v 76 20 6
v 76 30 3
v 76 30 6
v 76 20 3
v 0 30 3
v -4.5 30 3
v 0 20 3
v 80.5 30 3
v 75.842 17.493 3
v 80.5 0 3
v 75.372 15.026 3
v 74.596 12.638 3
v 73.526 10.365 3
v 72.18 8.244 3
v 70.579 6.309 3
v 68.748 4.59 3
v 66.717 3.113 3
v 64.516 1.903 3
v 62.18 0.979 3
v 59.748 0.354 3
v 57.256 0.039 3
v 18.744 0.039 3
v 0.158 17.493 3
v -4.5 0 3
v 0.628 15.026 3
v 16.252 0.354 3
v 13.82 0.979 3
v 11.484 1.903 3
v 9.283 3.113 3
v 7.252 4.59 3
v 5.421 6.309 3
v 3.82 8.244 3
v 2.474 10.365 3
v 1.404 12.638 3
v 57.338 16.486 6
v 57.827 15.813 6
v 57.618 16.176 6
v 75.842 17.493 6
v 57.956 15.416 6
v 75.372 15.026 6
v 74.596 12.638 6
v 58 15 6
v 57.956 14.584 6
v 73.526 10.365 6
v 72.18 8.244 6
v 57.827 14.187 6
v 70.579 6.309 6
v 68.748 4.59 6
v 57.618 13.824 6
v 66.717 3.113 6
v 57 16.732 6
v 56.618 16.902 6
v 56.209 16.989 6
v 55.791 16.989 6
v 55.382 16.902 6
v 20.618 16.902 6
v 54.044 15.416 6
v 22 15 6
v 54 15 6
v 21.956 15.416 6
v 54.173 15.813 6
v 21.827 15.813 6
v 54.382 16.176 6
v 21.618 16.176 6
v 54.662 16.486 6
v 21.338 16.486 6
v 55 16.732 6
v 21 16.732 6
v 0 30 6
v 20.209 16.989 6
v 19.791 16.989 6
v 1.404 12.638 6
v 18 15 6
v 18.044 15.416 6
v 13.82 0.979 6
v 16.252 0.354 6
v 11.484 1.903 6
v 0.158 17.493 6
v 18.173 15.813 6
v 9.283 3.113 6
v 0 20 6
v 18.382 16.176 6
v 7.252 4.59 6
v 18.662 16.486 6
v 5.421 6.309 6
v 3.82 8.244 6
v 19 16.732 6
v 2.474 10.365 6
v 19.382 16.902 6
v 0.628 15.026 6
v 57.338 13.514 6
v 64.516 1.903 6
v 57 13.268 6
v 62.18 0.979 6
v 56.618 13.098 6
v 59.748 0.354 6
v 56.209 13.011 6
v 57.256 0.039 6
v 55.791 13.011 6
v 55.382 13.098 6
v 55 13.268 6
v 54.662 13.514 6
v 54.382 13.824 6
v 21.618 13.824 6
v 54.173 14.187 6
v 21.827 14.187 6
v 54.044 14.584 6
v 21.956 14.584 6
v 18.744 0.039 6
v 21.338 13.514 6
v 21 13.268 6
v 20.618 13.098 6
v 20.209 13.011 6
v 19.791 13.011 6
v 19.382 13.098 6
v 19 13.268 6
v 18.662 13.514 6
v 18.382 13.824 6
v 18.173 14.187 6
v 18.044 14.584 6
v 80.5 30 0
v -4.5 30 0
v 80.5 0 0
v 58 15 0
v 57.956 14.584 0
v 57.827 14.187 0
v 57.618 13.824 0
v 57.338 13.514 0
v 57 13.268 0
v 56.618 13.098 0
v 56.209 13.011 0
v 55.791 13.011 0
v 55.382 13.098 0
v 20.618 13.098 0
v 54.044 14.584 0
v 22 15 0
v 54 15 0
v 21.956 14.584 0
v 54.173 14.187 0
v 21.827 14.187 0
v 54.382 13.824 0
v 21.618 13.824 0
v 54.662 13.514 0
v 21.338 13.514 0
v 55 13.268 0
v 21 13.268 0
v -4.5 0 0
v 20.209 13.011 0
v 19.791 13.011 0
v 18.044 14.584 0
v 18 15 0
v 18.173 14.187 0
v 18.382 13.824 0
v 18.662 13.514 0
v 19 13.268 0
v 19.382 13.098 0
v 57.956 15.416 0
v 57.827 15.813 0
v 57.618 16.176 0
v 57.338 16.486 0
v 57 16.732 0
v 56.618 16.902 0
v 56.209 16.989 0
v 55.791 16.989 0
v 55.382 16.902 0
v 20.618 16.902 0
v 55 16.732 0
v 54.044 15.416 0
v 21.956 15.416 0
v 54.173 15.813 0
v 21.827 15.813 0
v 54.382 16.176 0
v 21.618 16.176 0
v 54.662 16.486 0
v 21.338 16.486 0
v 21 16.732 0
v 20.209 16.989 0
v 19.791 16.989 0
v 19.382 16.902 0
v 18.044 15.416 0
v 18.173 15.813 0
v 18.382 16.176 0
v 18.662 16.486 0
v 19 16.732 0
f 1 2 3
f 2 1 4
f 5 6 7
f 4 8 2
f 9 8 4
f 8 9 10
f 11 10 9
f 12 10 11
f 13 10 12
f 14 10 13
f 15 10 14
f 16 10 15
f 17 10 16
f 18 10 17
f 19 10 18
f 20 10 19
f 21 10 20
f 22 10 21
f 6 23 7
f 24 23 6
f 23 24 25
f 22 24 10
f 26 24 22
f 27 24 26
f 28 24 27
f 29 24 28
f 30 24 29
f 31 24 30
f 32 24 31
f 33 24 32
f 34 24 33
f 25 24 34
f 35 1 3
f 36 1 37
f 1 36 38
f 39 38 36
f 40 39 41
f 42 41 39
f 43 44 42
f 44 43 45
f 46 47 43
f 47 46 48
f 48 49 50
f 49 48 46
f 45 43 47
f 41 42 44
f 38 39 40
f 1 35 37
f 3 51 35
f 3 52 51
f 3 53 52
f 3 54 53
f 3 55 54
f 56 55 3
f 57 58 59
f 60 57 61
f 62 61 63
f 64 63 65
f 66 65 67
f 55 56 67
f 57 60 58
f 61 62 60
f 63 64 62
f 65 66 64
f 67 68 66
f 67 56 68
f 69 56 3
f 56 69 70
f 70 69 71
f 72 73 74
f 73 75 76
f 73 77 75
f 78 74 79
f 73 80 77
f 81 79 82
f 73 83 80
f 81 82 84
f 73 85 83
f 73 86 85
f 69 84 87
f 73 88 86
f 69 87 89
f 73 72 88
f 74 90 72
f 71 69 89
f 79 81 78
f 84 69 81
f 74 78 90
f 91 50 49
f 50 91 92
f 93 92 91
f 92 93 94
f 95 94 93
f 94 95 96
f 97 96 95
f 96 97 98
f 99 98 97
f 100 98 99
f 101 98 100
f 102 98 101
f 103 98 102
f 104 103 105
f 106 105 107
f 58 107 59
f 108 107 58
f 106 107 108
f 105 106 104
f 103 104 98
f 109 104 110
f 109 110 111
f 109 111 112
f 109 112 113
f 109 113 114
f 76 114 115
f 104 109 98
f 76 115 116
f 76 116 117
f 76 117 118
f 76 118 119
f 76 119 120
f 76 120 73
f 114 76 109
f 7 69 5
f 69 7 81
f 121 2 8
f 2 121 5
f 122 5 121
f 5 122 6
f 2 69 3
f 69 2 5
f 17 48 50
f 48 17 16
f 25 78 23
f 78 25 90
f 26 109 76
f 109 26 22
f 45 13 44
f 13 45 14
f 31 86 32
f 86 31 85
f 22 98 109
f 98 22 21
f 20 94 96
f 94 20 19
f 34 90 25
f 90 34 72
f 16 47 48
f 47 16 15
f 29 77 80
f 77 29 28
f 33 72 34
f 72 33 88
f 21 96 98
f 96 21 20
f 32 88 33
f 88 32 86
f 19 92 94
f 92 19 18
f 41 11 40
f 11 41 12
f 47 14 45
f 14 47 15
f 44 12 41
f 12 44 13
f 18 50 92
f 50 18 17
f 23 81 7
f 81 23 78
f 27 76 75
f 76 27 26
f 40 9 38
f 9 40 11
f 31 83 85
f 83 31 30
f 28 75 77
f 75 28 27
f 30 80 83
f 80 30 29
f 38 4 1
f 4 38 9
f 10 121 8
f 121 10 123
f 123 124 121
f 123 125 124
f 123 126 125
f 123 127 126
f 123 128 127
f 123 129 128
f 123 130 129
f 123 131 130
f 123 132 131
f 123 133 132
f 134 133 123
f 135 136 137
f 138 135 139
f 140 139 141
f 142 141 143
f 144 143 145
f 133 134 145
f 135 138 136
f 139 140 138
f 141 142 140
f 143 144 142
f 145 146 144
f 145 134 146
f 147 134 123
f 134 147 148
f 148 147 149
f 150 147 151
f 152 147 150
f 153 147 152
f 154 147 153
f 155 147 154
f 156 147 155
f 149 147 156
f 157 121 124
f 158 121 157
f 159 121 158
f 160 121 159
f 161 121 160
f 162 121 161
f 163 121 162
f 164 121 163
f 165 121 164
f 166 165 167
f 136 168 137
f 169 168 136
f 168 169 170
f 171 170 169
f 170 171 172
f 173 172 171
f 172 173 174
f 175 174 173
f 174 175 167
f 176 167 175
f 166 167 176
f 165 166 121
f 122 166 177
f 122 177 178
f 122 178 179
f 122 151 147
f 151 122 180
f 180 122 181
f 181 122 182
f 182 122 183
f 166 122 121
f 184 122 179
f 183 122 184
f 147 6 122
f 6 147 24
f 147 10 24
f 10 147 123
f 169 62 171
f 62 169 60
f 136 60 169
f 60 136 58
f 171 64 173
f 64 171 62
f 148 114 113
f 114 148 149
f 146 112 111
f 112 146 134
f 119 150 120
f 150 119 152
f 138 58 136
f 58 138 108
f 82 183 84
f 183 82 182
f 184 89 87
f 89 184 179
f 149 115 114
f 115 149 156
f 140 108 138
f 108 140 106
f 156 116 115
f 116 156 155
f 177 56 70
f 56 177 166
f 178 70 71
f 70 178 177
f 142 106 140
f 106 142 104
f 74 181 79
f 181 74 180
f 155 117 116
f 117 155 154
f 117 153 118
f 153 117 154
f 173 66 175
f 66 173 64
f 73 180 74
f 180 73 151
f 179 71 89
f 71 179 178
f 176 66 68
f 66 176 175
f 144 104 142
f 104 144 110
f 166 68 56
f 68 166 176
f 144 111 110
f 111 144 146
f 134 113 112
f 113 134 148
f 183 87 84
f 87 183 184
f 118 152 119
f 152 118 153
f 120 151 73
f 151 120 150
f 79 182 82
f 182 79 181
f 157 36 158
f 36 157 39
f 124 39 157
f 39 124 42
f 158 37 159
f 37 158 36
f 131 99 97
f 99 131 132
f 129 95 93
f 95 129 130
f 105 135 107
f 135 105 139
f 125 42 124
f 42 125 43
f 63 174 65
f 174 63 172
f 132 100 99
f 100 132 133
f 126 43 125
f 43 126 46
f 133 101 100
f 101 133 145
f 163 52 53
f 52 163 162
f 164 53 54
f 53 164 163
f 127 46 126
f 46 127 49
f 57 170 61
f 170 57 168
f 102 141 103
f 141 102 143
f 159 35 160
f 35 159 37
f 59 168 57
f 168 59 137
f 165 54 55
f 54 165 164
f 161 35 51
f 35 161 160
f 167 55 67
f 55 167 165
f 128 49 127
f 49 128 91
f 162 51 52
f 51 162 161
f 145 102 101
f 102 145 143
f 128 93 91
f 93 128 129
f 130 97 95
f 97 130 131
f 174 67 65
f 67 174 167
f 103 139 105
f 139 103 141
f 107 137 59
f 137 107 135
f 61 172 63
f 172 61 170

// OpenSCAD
difference() {
  translate([0,0,6]) mirror([0,0,1]) {
  intersection(){
    cube([76,30,3]);
    minkowski(){
      translate([20,20]) cube([36,30,3]);
      cylinder(r=20,h=3,$fn=50);
    }
  }
  translate([-4.5,0,3]) 
    cube([85,30,3]);
}
  translate([20,15,-.01]) cylinder(d=4,h=10,$fn=30);
  translate([56,15,-.01]) cylinder(d=4,h=10,$fn=30);
}
